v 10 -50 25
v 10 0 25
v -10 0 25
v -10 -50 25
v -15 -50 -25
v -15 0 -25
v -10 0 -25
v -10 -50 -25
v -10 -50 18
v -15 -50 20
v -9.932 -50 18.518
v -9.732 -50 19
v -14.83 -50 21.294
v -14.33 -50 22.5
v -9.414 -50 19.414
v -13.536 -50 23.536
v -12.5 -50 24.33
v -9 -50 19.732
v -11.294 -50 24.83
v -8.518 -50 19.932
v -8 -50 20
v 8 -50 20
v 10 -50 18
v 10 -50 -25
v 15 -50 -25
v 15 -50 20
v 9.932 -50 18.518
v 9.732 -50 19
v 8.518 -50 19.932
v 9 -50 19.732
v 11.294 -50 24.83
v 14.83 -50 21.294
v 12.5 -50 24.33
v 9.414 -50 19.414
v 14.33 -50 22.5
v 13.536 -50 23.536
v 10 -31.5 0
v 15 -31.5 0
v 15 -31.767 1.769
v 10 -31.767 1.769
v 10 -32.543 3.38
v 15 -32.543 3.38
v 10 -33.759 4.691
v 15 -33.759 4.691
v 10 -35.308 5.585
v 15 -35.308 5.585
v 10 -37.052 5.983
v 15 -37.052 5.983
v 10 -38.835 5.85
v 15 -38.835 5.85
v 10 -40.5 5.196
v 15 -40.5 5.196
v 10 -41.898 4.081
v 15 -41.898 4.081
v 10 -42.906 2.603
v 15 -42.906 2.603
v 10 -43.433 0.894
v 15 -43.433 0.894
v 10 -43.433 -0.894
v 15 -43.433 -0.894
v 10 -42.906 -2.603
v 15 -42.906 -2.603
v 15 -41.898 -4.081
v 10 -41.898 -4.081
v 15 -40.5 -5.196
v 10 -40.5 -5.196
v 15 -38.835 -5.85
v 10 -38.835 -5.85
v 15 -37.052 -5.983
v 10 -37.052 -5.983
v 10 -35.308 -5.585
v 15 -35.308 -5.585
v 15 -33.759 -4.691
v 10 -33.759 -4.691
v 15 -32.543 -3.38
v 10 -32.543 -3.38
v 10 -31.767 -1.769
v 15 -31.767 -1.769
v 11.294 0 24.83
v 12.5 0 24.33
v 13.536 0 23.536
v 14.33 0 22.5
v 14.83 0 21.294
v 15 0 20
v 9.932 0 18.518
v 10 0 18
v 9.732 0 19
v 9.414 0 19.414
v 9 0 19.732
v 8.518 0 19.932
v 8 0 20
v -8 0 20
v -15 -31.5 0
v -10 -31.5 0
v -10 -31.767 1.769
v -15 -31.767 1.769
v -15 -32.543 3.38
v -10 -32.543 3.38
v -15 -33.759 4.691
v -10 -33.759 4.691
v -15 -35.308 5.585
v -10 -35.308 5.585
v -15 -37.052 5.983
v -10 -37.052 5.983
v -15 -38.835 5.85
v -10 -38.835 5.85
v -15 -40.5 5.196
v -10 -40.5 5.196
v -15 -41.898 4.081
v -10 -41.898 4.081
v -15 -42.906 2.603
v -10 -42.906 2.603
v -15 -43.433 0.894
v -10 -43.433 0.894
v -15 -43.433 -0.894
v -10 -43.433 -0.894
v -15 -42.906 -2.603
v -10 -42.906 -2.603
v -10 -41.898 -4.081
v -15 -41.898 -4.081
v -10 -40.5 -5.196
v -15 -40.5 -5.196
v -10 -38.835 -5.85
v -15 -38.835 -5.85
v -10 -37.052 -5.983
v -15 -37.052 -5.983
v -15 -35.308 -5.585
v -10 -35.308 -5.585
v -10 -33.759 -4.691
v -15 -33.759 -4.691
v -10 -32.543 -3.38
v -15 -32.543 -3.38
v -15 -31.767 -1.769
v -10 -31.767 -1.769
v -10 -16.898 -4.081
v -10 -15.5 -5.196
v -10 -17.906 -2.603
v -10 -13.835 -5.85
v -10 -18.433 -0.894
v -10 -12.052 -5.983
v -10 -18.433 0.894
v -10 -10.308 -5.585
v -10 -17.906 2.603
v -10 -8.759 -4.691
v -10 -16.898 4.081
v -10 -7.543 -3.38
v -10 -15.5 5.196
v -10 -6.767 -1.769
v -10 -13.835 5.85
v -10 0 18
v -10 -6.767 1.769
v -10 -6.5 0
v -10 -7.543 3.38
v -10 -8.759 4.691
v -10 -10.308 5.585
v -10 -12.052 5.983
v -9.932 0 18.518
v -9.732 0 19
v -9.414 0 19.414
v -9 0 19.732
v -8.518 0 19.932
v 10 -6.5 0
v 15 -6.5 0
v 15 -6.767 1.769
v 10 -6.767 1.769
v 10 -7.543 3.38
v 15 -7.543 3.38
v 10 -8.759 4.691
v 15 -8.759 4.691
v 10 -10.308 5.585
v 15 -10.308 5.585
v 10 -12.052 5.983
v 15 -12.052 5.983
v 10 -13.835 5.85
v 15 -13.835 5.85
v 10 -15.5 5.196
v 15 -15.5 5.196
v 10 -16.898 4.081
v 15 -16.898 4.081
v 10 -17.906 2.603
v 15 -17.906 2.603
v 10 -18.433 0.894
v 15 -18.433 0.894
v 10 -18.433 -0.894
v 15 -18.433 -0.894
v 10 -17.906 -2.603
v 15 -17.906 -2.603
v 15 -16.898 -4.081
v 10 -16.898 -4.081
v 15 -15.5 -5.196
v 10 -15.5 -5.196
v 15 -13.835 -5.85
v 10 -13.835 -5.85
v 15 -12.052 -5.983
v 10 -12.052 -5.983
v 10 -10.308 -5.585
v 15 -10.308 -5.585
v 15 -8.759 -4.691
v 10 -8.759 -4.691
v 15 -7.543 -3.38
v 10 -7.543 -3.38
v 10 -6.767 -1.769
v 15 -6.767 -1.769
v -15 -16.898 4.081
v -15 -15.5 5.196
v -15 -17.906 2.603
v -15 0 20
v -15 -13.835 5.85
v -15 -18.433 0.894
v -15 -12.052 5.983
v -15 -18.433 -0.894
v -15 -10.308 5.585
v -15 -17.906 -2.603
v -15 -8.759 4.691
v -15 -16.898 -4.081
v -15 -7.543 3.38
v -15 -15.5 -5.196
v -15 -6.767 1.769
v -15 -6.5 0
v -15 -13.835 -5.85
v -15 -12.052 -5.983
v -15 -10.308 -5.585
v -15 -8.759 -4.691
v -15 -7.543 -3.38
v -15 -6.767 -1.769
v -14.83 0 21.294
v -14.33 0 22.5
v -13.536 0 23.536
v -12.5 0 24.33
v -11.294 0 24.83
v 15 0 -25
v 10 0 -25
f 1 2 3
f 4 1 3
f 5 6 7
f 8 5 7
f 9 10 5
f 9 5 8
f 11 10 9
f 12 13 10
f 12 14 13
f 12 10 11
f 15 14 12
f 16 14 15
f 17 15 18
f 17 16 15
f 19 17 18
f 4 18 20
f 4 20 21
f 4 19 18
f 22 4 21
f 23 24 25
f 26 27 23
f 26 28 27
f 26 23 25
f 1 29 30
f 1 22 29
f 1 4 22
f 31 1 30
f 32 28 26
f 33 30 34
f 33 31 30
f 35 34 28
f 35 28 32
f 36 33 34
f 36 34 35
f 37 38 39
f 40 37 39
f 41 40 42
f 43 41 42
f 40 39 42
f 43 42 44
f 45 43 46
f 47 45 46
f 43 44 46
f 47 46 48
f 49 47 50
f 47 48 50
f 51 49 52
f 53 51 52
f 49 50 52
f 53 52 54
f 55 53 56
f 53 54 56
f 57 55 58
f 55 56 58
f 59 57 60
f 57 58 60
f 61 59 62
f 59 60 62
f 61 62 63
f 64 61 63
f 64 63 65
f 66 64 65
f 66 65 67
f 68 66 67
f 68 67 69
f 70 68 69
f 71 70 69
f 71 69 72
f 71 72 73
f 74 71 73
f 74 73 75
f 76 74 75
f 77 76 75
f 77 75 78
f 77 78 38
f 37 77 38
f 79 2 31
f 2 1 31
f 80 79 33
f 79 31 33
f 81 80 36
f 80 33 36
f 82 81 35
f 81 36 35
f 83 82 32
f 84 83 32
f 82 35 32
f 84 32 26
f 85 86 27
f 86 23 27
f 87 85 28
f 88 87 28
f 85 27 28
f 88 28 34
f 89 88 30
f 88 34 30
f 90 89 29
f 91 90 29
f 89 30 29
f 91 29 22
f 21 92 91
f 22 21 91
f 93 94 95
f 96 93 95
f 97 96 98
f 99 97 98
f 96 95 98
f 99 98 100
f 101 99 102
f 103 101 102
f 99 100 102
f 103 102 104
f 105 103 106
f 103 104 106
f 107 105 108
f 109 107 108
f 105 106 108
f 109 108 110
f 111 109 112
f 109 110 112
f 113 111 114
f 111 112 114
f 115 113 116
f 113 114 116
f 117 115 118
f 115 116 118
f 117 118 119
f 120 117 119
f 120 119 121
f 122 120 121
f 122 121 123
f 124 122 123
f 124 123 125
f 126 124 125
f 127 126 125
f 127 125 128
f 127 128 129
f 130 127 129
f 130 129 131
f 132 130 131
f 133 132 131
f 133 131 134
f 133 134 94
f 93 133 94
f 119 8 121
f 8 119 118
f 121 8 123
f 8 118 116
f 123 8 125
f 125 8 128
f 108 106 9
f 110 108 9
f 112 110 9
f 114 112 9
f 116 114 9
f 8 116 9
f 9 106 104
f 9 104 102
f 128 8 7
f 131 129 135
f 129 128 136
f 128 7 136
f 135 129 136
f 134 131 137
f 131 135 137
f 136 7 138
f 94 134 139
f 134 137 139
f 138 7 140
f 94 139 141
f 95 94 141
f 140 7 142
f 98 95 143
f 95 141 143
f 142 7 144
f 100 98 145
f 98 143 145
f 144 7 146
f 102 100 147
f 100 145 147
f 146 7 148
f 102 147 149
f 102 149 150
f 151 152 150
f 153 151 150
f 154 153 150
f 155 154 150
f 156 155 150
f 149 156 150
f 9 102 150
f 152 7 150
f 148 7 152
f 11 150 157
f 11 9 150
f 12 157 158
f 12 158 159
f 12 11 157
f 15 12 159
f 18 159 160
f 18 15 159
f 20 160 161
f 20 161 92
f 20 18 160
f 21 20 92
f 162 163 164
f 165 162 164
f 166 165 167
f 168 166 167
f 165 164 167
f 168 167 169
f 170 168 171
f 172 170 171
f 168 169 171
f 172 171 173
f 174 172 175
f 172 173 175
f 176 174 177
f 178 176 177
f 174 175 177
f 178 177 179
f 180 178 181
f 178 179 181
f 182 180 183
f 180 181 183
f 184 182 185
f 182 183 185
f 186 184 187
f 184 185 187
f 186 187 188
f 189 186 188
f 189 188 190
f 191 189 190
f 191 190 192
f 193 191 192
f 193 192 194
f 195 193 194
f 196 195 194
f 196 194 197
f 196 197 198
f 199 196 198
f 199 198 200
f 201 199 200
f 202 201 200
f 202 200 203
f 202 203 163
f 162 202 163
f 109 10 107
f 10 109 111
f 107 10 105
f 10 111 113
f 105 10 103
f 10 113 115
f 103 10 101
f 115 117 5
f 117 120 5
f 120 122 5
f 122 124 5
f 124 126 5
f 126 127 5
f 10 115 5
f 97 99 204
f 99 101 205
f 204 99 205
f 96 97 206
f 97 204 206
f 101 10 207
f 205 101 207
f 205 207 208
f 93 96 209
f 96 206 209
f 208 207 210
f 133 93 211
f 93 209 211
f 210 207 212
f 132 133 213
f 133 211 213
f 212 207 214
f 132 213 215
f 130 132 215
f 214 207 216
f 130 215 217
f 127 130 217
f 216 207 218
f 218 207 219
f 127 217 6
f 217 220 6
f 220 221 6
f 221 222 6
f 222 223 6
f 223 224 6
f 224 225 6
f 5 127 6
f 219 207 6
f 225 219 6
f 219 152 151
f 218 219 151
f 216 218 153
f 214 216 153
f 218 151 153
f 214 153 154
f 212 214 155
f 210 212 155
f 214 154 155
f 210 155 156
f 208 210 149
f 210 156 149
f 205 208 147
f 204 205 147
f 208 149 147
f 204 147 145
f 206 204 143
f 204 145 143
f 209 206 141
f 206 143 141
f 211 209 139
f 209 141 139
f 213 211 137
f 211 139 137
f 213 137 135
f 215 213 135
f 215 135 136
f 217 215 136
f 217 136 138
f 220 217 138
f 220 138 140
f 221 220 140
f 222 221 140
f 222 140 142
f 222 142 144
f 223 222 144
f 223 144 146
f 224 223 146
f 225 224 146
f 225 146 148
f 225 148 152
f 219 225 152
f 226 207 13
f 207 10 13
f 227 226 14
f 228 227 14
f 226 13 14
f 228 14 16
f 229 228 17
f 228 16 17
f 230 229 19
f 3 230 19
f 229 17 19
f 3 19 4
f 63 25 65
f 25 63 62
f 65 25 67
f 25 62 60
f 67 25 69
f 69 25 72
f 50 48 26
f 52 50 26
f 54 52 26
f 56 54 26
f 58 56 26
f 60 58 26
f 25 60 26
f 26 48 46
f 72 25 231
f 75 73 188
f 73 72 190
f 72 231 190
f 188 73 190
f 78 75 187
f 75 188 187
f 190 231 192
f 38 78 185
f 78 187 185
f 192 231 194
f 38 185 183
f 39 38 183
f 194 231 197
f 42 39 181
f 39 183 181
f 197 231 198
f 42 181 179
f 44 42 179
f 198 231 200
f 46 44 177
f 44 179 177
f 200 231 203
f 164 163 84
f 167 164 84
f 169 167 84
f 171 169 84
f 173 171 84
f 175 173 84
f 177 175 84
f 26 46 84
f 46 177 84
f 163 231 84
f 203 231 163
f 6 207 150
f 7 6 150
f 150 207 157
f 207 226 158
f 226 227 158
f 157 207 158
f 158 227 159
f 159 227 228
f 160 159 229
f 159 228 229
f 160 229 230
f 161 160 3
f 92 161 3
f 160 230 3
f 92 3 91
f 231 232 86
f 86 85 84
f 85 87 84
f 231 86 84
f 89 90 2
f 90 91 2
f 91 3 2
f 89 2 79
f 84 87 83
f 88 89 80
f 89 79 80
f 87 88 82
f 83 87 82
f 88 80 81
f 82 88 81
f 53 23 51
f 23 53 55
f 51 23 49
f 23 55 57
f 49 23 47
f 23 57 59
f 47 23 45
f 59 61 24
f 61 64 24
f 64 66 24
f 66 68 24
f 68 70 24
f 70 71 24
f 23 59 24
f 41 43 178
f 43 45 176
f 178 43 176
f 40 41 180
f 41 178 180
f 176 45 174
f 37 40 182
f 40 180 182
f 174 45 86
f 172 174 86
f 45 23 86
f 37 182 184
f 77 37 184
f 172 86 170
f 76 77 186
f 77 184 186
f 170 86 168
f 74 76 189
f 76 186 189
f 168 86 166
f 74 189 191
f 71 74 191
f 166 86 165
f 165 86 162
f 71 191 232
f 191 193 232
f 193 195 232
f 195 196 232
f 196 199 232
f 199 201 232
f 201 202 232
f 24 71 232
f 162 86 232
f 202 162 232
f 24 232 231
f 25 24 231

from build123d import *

# Parameters (mm, degrees)
F1_DEPTH = 50
F2_R     = 6
F3_DEPTH = 30
F4_R     = 2
F5_R     = 5


with BuildPart() as f1:
    # F0 (on Front) → F1 (new body)
    with BuildSketch(Plane.XZ):
        Polygon((15, -25), (15, 25), (-15, 25), (-15, -25), (-10, -25), (-10, 20), (10, 20), (10, -25), align=None)
    extrude(amount=F1_DEPTH)

    # F2 (on face) → F3 (cut, through all)
    with BuildSketch(Plane.YZ.offset(15)):
        with Locations((-37.5, 0)):
            Circle(F2_R)
        with Locations((-12.5, 0)):
            Circle(F2_R)
    extrude(amount=-F3_DEPTH, mode=Mode.SUBTRACT)

    # F4
    f4_edges = [f1.edges().sort_by_distance(p)[0] for p in [
        (-10, -25, 20),
        (10, -25, 20),
    ]]
    fillet(f4_edges, radius=F4_R)

    # F5
    f5_edges = [f1.edges().sort_by_distance(p)[0] for p in [
        (15, -25, 25),
        (-15, -25, 25),
    ]]
    fillet(f5_edges, radius=F5_R)


solid = f1.part
